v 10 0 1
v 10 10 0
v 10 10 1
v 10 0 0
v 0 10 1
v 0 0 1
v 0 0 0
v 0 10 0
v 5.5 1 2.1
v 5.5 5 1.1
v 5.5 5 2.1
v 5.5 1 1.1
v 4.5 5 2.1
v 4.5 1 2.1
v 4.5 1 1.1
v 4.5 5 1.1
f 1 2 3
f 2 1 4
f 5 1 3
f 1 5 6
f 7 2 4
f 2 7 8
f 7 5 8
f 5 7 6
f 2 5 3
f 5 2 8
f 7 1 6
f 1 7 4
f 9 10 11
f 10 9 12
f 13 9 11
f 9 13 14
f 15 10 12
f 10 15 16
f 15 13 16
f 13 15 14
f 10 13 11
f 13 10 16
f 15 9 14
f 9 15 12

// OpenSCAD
// file: triangle.scad
module triangle(base=10, length=10, rise=2.5, z=1){
    
    points=[
        //bottom and top triangle portion
        [0,0,0],[0,0,z],[0,base,0],[0,base,z],
        [length,rise,0],[length,rise,z],
    ];
    
    faces=[
        [0,2,4], //bot
        [5,3,1], //top
        [0,2,3,1], //tangent brick
        [0,1,5,4], //side square
        [4,5,3,2], //side square
    ];
           
        
     polyhedron(points, faces);
        
        
 
    
    }
//triangle();
// main file
use <triangle.scad>;

cube([10,10,1]);

    //color("blue")
    //translate([5,0,2]) cylinder(h=1, r=1.5);
color("blue")
translate([4.5, 1, 1.1]) rotate([0,0,0]) cube([1, 4, 1]);
//color("blue")
//translate([7, 1, 1.1]) rotate([0,0,90]) cube([1, 4, 1]);
color("blue")
translate([7,5,1.1]) rotate([0,0,90]) triangle(base=4,length=4, rise=2,z=1);
